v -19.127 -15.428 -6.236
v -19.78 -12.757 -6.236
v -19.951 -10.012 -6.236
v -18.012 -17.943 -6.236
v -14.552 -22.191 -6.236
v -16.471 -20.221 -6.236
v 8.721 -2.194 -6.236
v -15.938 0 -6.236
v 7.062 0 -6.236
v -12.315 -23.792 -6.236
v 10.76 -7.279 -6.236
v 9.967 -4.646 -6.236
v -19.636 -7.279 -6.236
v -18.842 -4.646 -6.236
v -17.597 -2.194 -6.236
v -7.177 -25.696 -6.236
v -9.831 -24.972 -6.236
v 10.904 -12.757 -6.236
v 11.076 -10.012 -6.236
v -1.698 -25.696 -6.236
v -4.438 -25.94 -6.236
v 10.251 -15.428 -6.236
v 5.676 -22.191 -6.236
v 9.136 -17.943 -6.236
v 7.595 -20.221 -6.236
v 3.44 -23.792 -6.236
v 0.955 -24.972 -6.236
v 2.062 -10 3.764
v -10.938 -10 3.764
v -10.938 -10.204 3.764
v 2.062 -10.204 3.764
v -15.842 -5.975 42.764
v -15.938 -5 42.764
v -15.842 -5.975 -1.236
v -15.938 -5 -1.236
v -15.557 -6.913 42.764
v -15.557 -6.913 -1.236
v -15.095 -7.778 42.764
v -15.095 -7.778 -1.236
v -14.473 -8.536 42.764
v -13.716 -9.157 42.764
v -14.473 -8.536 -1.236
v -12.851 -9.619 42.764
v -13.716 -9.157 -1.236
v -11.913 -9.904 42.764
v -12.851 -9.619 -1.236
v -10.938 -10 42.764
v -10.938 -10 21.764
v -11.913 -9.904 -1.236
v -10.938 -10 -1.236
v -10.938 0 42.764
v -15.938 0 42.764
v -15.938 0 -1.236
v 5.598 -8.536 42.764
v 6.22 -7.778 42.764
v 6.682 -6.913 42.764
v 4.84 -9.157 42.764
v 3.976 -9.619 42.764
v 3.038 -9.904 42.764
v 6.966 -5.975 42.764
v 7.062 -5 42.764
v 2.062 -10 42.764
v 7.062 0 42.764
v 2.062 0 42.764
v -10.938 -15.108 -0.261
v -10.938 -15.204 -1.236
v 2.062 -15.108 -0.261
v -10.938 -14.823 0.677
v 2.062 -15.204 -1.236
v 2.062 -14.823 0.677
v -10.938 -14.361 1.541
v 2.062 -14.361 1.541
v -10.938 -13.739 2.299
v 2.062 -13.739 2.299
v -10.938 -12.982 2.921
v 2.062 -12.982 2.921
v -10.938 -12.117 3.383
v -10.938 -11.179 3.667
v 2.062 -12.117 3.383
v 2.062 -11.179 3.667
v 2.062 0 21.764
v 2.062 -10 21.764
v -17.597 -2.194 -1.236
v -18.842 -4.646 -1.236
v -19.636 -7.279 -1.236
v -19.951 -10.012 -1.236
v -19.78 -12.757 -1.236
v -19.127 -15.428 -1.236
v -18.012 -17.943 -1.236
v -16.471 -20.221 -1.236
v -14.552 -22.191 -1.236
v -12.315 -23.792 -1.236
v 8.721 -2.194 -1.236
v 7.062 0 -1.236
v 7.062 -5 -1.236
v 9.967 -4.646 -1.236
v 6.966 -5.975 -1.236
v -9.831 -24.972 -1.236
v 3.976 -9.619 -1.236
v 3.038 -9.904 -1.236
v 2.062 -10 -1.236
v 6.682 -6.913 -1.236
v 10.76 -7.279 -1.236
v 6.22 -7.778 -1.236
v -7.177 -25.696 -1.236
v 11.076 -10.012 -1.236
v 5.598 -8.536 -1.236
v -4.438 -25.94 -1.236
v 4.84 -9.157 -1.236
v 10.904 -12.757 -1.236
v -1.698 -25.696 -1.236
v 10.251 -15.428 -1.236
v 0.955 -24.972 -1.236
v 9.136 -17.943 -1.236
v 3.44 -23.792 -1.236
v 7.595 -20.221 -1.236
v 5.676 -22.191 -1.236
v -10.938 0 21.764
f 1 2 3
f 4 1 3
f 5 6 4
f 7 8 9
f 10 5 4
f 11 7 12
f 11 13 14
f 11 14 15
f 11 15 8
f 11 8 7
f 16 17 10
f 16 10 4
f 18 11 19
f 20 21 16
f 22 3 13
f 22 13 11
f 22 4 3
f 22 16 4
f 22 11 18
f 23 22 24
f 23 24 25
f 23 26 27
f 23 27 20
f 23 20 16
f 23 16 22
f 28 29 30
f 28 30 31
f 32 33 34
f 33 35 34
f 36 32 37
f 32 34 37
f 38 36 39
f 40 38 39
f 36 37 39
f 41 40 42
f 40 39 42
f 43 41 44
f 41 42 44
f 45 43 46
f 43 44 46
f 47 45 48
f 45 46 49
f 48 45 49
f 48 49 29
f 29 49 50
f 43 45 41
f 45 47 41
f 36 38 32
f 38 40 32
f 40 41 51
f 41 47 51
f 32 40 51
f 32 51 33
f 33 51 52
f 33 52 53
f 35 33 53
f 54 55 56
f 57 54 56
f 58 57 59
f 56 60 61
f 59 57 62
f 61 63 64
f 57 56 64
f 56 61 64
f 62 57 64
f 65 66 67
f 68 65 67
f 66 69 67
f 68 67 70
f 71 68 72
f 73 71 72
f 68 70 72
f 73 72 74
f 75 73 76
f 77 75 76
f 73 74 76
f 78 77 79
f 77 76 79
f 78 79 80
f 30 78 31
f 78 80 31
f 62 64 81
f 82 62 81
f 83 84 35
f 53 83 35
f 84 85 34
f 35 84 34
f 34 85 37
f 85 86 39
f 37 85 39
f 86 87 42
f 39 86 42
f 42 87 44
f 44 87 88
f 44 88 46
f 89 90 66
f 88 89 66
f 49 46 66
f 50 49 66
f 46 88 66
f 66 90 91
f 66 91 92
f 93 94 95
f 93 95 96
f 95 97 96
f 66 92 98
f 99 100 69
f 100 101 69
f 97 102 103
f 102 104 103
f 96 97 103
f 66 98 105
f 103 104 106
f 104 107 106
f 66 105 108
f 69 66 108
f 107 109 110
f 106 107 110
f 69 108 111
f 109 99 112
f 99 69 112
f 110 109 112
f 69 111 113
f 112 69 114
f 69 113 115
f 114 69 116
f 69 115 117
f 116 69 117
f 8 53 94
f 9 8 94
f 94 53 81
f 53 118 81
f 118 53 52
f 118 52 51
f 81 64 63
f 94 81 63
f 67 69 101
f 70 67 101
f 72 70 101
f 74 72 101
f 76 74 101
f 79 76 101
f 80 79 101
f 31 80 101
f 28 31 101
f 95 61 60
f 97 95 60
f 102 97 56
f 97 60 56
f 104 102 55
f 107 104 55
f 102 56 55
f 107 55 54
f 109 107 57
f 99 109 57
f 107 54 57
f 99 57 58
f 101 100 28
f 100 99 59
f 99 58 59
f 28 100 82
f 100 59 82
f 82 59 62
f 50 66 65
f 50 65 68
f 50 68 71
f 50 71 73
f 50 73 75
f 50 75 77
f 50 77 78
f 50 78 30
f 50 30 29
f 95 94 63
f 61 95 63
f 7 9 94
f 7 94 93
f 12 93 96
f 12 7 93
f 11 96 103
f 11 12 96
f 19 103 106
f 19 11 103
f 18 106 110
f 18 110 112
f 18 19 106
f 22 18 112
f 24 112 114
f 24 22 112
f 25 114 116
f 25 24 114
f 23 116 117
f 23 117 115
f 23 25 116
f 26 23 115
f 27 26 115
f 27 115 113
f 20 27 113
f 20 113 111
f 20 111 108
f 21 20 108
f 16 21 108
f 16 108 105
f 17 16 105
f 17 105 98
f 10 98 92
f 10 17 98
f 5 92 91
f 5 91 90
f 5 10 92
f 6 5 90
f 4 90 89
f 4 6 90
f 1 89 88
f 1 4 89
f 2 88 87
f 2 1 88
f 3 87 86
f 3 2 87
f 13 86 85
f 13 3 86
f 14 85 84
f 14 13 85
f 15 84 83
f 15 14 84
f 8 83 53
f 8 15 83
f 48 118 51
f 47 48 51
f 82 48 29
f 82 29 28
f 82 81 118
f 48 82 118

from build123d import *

# Parameters (mm, degrees)
F1_DEPTH = 10
F3_DEPTH = 5
F4_R     = 5
F5_W     = 13
F5_H     = 5.2037292719
F6_DEPTH = 5
F7_R     = 4.99999


# Not quite as in the source:
# - a fillet or chamfer is up to 0.001 mm smaller than in the source, because OpenCascade refuses the exact size


with BuildPart() as f1:
    # F0 (on Front) → F1 (new body)
    with BuildSketch(Plane.XZ):
        Polygon((-10.9377613165, 42.7635207549), (-15.9377613165, 42.7635207549), (-15.9377613165, -6.2364792451), (7.0622386835, -6.2364792451), (7.0622386835, 42.7635207549), (2.0622386835, 42.7635207549), (2.0622386835, 21.7635207549), (-10.9377613165, 21.7635207549), align=None)
    extrude(amount=F1_DEPTH)

    # F2 (on face) → F3 (join)
    with BuildSketch(Plane(origin=(0, 0, -6.2364792451), x_dir=(1, 0, 0), z_dir=(0, 0, -1))):
        with BuildLine():
            Line((7.0622386835, 10), (7.0622386835, 0))
            ThreePointArc((7.0622386835, 0), (-4.4377613165, 25.9396283258), (-15.9377613165, 0))
            Line((-15.9377613165, 0), (-15.9377613165, 10))
            Line((-15.9377613165, 10), (7.0622386835, 10))
        make_face()
    extrude(amount=-F3_DEPTH)

    # F4
    f4_edges = [f1.edges().sort_by_distance(p)[0] for p in [
        (-15.937761, -10, 20.763521),
        (7.062239, -10, 20.763521),
    ]]
    fillet(f4_edges, radius=F4_R)

    # F5 (on face) → F6 (join)
    with BuildSketch(Plane.XY.offset(-1.2364792451)):
        with Locations((-4.4377613165, -12.6018646359)):
            Rectangle(F5_W, F5_H)
    extrude(amount=F6_DEPTH)

    # F7 (radius 5 in the source; OpenCascade refuses exactly that, so slightly less here)
    f7_edges = [f1.edges().sort_by_distance(p)[0] for p in [
        (-4.437761, -15.203729, 3.763521),
    ]]
    fillet(f7_edges, radius=F7_R)


solid = f1.part
